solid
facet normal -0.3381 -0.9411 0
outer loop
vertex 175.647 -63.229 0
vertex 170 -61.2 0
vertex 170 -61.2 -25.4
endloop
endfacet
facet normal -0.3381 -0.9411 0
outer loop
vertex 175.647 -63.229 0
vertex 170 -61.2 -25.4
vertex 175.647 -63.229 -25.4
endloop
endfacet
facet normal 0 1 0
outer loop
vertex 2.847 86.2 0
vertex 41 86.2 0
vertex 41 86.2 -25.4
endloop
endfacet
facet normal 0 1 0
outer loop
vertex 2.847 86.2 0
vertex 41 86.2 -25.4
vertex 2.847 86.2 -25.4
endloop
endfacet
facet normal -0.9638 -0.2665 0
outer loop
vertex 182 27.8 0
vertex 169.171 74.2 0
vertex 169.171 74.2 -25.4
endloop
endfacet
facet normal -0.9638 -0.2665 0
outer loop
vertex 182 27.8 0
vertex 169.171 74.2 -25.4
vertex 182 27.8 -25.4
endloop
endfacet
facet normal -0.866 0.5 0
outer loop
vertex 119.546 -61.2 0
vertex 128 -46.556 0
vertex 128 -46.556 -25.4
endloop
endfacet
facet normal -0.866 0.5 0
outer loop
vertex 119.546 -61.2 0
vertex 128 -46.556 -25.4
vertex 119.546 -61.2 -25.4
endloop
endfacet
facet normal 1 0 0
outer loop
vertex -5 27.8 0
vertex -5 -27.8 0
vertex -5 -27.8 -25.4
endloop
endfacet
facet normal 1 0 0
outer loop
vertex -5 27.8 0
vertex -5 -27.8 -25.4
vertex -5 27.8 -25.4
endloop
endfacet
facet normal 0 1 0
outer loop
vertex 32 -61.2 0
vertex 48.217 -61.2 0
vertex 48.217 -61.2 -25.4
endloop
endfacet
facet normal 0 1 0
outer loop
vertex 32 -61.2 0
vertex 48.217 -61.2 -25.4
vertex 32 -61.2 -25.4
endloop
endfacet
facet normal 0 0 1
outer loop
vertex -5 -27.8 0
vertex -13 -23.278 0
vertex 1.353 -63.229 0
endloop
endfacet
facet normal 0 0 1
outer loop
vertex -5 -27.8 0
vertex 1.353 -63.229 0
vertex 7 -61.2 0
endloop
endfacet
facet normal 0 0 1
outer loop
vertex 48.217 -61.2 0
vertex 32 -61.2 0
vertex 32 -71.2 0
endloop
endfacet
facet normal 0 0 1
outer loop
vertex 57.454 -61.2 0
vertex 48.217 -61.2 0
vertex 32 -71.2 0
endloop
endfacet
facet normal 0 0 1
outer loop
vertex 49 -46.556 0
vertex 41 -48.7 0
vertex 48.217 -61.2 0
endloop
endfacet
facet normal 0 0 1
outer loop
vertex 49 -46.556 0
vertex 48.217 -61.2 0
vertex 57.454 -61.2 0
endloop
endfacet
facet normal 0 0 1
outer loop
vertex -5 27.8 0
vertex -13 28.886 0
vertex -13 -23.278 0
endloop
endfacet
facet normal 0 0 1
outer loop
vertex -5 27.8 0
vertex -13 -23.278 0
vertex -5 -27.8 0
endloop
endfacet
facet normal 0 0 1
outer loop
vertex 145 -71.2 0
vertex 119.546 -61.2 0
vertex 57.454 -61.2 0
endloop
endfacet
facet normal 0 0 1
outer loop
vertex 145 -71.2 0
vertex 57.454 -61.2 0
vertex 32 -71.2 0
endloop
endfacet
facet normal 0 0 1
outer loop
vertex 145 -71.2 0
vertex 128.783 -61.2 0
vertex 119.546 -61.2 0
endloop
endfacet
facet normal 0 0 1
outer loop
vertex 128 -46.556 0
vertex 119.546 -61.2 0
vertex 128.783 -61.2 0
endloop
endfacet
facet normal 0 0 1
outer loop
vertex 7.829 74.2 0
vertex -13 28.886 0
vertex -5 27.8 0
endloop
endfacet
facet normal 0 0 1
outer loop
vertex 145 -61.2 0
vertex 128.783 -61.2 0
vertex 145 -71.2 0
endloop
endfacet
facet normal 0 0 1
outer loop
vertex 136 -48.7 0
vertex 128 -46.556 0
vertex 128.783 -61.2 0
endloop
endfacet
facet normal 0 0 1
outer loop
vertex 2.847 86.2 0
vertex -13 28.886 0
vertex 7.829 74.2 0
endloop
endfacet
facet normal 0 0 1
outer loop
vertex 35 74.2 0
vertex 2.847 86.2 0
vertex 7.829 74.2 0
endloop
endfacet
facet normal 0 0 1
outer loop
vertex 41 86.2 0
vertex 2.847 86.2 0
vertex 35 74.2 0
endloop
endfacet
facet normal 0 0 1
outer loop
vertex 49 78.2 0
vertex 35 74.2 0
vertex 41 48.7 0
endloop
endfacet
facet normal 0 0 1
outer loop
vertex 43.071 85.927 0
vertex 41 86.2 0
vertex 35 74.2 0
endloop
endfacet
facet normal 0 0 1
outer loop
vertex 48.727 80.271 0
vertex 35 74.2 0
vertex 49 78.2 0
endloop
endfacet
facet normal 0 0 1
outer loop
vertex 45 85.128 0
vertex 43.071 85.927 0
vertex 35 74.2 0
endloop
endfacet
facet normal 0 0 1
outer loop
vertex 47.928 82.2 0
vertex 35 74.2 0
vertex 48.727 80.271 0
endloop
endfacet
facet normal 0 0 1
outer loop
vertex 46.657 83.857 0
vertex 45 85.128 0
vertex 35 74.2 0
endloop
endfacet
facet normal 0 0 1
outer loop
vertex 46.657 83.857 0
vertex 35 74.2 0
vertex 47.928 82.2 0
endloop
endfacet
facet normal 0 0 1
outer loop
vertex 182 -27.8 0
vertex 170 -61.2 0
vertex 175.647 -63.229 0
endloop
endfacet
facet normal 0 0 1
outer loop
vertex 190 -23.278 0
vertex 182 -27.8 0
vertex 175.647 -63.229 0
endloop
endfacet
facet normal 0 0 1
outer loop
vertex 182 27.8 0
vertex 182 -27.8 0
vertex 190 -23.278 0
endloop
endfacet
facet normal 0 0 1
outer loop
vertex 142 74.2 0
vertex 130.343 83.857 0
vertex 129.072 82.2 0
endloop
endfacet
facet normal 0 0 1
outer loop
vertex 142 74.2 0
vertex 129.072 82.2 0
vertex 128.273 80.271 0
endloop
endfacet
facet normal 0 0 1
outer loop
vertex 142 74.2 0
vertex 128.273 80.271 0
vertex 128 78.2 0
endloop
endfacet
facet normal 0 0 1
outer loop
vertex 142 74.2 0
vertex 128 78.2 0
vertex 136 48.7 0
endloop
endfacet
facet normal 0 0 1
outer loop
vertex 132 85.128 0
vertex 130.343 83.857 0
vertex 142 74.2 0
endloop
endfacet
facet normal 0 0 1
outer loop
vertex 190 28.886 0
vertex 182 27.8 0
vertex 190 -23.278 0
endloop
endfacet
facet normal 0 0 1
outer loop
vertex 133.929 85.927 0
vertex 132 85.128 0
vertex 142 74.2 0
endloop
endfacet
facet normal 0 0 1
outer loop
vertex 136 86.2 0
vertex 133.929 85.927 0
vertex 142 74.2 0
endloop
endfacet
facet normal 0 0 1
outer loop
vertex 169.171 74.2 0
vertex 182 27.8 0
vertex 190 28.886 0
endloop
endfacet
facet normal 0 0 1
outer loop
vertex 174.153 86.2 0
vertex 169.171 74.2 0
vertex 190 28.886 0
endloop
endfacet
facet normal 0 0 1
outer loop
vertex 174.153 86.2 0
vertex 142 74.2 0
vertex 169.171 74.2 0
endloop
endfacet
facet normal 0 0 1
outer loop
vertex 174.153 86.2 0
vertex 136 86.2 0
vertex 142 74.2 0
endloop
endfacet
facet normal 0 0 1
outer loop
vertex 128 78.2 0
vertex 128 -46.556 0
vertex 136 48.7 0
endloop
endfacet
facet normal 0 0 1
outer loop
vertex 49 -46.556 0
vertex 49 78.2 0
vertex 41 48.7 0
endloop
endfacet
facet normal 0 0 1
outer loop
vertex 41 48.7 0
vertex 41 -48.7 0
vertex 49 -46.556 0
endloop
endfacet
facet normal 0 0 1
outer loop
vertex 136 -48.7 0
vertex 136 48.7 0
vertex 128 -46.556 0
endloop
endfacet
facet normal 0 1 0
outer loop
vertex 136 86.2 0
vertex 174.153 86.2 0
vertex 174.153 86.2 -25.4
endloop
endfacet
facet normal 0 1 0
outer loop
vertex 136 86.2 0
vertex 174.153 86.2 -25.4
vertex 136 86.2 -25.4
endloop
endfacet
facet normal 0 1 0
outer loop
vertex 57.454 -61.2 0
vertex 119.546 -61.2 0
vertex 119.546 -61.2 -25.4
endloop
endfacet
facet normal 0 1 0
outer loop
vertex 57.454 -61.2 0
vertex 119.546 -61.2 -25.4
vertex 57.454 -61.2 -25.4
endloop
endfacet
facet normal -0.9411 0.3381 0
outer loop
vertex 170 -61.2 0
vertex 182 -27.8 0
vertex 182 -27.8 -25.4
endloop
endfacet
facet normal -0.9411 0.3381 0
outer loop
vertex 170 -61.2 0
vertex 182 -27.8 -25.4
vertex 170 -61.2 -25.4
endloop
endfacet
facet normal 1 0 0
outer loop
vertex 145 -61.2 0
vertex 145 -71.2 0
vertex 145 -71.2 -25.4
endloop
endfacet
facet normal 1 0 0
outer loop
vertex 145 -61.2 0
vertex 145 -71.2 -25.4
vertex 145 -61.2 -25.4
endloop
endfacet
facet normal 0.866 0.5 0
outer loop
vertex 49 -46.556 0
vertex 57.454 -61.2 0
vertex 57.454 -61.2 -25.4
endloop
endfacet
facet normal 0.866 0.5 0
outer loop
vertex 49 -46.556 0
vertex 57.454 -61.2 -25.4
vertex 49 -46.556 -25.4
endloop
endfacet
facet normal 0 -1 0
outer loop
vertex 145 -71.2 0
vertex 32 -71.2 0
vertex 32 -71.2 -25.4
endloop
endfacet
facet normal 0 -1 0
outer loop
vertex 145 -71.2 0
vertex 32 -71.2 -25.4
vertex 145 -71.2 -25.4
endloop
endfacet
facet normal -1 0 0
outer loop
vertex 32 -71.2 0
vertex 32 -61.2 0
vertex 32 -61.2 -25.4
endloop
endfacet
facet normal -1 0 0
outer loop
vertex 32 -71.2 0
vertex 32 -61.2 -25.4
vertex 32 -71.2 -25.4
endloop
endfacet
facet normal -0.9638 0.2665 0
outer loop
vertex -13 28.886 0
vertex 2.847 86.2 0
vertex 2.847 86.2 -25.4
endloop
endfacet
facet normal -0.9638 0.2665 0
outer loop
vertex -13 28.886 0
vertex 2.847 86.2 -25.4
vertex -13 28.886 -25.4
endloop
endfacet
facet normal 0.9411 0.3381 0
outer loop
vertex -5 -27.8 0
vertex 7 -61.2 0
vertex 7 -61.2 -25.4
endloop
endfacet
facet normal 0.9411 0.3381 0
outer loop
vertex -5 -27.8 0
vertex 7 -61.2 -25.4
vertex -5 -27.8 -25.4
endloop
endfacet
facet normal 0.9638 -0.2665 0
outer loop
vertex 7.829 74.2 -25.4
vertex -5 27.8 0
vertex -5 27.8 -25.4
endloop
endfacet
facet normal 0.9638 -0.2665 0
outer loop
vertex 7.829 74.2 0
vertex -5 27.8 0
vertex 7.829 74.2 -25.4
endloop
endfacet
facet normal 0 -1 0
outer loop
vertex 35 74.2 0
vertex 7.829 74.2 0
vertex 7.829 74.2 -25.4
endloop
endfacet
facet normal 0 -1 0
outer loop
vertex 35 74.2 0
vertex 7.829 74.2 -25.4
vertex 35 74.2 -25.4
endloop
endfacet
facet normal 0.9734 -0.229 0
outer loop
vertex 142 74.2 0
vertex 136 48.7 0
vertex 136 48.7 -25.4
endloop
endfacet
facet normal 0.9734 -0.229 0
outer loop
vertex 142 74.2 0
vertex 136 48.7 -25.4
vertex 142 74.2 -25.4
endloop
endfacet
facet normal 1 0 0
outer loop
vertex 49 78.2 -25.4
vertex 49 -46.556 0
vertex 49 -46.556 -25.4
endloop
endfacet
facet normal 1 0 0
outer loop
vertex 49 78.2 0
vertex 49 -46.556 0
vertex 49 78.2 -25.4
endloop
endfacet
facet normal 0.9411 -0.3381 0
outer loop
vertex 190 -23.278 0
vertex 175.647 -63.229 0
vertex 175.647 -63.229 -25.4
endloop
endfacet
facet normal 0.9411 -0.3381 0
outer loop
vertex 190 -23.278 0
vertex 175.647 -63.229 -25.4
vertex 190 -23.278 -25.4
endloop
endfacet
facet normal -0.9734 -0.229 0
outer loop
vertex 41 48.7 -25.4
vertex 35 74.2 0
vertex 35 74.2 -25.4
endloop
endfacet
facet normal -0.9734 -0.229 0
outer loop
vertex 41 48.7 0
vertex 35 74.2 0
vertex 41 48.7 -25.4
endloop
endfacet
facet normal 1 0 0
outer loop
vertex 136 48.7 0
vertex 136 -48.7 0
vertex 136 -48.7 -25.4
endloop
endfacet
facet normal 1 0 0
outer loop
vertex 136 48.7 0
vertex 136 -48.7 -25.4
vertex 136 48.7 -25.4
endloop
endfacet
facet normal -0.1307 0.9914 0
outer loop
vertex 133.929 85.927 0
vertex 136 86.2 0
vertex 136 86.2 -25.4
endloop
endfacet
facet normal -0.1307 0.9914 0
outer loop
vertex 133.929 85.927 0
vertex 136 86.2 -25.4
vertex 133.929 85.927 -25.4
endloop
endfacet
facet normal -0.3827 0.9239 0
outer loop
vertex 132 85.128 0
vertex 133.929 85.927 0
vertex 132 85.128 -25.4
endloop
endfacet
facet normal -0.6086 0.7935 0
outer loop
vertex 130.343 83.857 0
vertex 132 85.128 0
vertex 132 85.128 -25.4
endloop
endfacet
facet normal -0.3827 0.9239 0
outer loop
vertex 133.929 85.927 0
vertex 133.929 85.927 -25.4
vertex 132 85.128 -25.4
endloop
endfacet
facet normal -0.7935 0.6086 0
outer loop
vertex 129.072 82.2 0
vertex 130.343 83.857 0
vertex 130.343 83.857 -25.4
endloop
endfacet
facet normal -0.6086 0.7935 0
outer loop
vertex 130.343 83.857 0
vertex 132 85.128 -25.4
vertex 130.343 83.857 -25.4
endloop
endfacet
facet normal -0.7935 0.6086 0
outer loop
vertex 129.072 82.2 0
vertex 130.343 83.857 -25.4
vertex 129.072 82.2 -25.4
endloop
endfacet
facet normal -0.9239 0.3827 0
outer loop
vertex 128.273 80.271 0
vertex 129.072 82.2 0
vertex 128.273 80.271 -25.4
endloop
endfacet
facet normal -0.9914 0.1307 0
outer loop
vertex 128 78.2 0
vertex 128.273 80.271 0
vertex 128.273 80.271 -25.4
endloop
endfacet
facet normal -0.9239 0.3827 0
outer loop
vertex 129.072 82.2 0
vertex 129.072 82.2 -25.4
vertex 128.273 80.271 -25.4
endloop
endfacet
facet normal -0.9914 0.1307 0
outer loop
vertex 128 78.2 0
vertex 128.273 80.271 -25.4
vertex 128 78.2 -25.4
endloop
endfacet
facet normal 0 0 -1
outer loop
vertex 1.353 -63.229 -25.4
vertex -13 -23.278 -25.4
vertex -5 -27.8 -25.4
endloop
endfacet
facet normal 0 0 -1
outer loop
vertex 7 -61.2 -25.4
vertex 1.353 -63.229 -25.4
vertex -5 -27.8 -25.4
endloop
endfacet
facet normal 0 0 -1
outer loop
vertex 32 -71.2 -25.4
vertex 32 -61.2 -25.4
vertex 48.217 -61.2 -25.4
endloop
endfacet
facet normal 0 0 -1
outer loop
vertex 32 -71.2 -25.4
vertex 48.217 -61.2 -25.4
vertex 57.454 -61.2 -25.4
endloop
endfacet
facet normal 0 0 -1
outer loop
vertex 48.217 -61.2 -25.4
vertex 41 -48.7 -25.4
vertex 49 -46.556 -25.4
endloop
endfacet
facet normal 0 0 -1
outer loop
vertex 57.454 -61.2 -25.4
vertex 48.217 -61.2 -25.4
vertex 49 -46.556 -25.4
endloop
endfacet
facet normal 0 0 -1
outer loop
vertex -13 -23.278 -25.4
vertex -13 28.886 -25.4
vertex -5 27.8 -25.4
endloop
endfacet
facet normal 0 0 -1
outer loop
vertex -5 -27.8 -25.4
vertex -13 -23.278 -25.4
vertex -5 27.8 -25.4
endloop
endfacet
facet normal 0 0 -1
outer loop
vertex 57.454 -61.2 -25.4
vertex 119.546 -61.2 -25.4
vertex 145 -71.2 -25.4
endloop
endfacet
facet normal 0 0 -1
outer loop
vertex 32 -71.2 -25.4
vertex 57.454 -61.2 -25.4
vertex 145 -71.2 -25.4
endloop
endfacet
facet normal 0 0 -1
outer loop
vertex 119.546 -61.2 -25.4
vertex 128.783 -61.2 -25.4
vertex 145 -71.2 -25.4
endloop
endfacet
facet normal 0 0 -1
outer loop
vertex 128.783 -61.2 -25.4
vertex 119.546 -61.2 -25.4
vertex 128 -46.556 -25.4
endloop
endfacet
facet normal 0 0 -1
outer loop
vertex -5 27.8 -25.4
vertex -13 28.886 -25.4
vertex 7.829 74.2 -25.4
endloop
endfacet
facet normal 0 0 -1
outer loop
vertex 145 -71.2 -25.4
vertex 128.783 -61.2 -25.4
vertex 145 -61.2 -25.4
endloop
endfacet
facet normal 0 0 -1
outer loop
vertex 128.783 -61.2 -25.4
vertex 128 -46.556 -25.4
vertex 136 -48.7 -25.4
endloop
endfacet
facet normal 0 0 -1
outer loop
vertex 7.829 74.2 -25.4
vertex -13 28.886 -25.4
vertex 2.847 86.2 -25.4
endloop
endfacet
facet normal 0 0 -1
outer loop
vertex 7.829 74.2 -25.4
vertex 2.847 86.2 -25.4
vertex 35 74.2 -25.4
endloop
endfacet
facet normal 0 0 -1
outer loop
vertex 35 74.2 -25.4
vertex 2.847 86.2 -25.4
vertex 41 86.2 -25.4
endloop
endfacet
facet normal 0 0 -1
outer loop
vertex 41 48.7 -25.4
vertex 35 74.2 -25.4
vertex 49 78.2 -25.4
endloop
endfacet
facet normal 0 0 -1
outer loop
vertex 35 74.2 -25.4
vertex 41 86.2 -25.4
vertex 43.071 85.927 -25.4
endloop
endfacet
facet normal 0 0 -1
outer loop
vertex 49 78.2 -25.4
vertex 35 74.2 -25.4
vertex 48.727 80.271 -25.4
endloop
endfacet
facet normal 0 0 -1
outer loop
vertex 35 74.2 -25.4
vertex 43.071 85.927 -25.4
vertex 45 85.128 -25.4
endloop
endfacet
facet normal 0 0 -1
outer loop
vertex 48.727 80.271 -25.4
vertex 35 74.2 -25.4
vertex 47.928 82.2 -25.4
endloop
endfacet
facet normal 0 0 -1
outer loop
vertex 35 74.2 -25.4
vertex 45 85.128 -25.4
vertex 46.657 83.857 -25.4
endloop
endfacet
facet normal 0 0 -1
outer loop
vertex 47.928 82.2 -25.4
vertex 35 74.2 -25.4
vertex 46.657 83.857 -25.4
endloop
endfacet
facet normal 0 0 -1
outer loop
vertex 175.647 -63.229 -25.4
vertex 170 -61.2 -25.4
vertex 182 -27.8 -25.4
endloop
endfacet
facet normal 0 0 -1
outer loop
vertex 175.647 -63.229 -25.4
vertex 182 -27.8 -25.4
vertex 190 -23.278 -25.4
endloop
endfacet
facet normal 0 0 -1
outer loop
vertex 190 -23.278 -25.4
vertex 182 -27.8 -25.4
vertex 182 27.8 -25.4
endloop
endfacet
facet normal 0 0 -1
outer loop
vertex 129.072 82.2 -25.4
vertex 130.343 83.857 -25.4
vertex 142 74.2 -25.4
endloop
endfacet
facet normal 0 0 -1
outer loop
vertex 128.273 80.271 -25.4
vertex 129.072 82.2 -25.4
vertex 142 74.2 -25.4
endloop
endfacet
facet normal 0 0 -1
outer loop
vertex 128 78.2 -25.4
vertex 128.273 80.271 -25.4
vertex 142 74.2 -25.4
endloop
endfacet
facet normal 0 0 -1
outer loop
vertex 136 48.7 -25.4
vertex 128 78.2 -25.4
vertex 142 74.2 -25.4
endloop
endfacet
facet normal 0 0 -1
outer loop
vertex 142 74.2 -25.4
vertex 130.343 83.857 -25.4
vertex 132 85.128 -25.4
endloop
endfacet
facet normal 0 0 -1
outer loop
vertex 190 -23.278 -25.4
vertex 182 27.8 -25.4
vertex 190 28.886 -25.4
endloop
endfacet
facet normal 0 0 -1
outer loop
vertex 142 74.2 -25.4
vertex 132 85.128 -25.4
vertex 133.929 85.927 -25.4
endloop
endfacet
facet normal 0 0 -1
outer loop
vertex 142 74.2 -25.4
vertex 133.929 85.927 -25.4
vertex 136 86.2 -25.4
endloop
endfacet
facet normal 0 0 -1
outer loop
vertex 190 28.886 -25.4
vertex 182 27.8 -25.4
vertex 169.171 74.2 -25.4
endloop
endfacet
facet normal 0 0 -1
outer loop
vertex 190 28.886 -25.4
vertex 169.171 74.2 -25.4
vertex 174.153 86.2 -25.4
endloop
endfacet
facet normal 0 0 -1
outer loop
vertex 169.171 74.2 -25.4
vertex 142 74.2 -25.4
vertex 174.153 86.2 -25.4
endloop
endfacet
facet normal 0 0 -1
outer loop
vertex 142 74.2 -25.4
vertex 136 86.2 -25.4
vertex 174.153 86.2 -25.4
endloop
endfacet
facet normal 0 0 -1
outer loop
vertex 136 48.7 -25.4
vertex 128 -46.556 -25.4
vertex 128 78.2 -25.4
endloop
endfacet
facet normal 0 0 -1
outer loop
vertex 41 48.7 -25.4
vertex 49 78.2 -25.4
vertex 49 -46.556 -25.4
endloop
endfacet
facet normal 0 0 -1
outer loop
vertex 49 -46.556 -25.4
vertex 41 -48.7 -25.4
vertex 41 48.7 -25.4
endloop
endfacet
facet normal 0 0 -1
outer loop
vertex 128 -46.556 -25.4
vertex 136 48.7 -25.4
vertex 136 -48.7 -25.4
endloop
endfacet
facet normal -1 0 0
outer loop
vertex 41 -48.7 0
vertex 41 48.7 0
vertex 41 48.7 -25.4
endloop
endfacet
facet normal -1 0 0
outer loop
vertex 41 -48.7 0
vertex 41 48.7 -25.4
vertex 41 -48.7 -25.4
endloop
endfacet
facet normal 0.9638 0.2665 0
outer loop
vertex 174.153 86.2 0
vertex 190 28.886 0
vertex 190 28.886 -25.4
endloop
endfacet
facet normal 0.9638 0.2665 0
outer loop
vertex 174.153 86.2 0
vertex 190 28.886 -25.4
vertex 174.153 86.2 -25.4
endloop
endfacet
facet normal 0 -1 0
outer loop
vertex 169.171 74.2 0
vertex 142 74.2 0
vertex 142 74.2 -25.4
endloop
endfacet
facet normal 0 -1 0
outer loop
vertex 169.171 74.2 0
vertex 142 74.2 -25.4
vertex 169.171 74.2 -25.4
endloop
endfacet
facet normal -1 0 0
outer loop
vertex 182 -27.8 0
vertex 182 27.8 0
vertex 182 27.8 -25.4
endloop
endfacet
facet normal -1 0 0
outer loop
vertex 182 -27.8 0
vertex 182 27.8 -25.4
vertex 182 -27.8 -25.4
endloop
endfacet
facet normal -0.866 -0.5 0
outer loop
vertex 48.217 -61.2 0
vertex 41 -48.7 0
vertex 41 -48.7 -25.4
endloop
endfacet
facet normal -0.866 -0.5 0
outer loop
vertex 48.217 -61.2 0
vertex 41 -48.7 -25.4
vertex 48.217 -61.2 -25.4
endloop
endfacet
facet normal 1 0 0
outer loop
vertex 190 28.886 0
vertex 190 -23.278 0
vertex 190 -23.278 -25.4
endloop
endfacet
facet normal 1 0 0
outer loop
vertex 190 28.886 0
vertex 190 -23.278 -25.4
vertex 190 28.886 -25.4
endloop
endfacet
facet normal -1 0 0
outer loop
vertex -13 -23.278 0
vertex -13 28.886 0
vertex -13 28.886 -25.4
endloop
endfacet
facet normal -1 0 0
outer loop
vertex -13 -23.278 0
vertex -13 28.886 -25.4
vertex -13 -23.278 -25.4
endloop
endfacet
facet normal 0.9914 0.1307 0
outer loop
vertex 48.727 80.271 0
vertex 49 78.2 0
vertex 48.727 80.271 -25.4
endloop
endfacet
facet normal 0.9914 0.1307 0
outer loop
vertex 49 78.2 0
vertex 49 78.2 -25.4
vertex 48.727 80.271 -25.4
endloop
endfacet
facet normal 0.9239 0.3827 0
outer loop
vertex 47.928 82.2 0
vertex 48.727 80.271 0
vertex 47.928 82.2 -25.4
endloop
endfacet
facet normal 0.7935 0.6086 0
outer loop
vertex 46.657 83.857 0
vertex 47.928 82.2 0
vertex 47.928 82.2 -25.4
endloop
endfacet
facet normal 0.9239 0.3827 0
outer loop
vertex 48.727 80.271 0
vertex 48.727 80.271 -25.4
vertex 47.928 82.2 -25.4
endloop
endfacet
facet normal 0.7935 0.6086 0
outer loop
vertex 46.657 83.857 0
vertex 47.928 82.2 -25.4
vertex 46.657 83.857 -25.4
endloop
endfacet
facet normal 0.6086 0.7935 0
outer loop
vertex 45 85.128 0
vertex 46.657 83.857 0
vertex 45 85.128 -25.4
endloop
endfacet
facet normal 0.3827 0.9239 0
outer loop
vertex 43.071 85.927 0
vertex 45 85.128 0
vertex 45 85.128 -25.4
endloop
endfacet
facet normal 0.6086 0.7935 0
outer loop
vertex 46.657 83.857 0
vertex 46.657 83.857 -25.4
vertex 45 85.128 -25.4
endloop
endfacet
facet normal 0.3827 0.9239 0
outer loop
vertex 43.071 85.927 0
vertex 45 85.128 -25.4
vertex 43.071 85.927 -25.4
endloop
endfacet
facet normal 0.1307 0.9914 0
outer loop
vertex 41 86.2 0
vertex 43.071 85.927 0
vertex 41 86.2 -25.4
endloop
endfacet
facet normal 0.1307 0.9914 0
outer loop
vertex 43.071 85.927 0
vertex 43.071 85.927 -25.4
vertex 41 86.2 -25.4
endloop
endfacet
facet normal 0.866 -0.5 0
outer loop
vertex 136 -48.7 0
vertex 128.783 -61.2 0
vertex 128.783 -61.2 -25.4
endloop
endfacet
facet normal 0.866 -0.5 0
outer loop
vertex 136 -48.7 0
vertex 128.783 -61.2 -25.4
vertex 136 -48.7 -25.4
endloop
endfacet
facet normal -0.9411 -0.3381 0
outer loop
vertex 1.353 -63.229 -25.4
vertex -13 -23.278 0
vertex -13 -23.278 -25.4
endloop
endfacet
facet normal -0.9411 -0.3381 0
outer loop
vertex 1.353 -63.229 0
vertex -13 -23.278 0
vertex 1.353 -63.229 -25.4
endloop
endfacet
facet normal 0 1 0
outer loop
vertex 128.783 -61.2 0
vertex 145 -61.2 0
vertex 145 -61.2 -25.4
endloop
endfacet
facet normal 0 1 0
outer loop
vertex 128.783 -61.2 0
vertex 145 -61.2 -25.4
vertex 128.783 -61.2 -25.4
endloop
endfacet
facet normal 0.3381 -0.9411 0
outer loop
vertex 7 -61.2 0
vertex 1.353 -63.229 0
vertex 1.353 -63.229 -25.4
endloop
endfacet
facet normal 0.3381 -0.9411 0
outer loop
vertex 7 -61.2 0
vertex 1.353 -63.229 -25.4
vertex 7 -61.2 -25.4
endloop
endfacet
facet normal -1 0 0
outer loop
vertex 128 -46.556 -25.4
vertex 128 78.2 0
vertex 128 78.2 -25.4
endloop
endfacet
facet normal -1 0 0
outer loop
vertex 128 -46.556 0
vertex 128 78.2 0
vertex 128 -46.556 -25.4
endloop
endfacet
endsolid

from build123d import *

# Parameters (mm, degrees)
BOSS_EXTRUDE1_DEPTH = 25.4
FILLET1_R           = 8


with BuildPart() as part:
    # Sketch1 → Boss-Extrude1 (new body)
    with BuildSketch(Plane.XY):
        Polygon((7, -61.2), (-5, -27.8), (-5, 27.8), (7.829493088, 74.2), (35, 74.2), (41, 48.7), (41, -48.7), (48.216878365, -61.2), (32, -61.2), (32, -71.2), (145, -71.2), (145, -61.2), (128.783121635, -61.2), (136, -48.7), (136, 48.7), (142, 74.2), (169.170506912, 74.2), (182, 27.8), (182, -27.8), (170, -61.2), (175.646616425, -63.228724464), (190, -23.278473513), (190, 28.88562364), (174.152706997, 86.2), (128, 86.2), (128, -46.556406461), (119.545517328, -61.2), (57.454482672, -61.2), (49, -46.556406461), (49, 86.2), (2.847293003, 86.2), (-13, 28.88562364), (-13, -23.278473513), (1.353383575, -63.228724464), align=None)
    extrude(amount=-BOSS_EXTRUDE1_DEPTH)

    # Fillet1
    fillet1_edges = [part.edges().sort_by_distance(p)[0] for p in [
        (49, 86.2, -12.7),
        (128, 86.2, -12.7),
    ]]
    fillet(fillet1_edges, radius=FILLET1_R)


solid = part.part
